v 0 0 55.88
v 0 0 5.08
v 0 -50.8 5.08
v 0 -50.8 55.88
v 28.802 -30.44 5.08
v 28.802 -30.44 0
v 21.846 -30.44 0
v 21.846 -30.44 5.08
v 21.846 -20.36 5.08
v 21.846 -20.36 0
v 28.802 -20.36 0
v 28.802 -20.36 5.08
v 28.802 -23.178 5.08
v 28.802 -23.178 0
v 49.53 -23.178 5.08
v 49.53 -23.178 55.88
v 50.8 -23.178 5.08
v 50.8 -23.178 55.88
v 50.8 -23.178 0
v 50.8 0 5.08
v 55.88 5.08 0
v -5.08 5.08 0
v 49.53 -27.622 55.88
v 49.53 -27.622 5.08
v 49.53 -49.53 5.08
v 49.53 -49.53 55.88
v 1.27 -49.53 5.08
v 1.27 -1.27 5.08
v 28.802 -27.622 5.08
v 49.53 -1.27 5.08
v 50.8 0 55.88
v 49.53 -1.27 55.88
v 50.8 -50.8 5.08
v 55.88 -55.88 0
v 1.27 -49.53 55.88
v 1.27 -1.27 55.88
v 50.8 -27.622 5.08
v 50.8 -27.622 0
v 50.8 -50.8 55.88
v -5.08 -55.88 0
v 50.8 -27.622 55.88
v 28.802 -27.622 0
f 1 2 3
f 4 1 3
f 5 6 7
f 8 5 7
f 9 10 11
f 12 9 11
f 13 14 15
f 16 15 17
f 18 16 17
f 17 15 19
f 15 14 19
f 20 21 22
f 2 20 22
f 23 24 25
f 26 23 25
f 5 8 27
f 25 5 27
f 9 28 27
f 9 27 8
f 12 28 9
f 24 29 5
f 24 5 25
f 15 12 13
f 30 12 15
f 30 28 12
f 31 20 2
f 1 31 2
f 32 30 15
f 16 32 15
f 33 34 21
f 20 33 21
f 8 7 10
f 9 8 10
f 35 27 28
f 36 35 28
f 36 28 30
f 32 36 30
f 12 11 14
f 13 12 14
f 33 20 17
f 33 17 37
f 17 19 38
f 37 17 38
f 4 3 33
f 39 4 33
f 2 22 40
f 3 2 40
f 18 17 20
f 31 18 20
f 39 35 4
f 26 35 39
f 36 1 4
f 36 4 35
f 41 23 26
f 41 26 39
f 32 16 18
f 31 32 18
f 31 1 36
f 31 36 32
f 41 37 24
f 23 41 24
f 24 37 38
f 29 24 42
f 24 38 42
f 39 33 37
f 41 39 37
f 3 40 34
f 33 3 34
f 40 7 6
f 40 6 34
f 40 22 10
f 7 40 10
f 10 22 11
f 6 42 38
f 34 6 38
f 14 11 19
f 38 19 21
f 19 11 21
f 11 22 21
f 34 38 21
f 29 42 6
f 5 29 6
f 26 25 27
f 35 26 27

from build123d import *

# Parameters (mm, degrees)
F0_W     = 5.08
F0_H     = 4.445
F1_DEPTH = 5.08
F2_DEPTH = 55.88
F4_SIZE  = 5.07999


# Not quite as in the source:
# - a fillet or chamfer is up to 0.001 mm smaller than in the source, because OpenCascade refuses the exact size


with BuildPart() as f1:
    # F0 (on Top) → F1 (new body)
    with BuildSketch(Plane.XY):
        Polygon((0, -50.8), (0, 0), (50.8, 0), (50.8, -23.1775), (55.88, -23.1775), (55.88, 5.08), (-5.08, 5.08), (-5.08, -55.88), (55.88, -55.88), (55.88, -27.6225), (50.8, -27.6225), (50.8, -50.8), align=None)
        with Locations((53.34, -25.4)):
            Rectangle(F0_W, F0_H)
        Polygon((28.8019571453, -23.1775), (49.53, -23.1775), (49.53, -1.27), (1.27, -1.27), (1.27, -49.53), (49.53, -49.53), (49.53, -27.6225), (28.8019571453, -27.6225), (28.8019571453, -30.439995), (21.8463055789, -30.439995), (21.8463055789, -20.360005), (28.8019571453, -20.360005), align=None)
        Polygon((50.8, 0), (0, 0), (0, -50.8), (50.8, -50.8), (50.8, -27.6225), (49.53, -27.6225), (49.53, -49.53), (1.27, -49.53), (1.27, -1.27), (49.53, -1.27), (49.53, -23.1775), (50.8, -23.1775), align=None)
    extrude(amount=F1_DEPTH)

    # F0 (on Top) → F2 (join)
    with BuildSketch(Plane.XY):
        Polygon((50.8, 0), (0, 0), (0, -50.8), (50.8, -50.8), (50.8, -27.6225), (49.53, -27.6225), (49.53, -49.53), (1.27, -49.53), (1.27, -1.27), (49.53, -1.27), (49.53, -23.1775), (50.8, -23.1775), align=None)
    extrude(amount=F2_DEPTH)

    # F4 (size 5.08 in the source; OpenCascade refuses exactly that, so slightly less here)
    f4_edges = [f1.edges().sort_by_distance(p)[0] for p in [
        (-5.08, -25.4, 5.08),
        (25.4, -55.88, 5.08),
        (55.88, -25.4, 5.08),
        (25.4, 5.08, 5.08),
    ]]
    chamfer(f4_edges, length=F4_SIZE)


solid = f1.part
